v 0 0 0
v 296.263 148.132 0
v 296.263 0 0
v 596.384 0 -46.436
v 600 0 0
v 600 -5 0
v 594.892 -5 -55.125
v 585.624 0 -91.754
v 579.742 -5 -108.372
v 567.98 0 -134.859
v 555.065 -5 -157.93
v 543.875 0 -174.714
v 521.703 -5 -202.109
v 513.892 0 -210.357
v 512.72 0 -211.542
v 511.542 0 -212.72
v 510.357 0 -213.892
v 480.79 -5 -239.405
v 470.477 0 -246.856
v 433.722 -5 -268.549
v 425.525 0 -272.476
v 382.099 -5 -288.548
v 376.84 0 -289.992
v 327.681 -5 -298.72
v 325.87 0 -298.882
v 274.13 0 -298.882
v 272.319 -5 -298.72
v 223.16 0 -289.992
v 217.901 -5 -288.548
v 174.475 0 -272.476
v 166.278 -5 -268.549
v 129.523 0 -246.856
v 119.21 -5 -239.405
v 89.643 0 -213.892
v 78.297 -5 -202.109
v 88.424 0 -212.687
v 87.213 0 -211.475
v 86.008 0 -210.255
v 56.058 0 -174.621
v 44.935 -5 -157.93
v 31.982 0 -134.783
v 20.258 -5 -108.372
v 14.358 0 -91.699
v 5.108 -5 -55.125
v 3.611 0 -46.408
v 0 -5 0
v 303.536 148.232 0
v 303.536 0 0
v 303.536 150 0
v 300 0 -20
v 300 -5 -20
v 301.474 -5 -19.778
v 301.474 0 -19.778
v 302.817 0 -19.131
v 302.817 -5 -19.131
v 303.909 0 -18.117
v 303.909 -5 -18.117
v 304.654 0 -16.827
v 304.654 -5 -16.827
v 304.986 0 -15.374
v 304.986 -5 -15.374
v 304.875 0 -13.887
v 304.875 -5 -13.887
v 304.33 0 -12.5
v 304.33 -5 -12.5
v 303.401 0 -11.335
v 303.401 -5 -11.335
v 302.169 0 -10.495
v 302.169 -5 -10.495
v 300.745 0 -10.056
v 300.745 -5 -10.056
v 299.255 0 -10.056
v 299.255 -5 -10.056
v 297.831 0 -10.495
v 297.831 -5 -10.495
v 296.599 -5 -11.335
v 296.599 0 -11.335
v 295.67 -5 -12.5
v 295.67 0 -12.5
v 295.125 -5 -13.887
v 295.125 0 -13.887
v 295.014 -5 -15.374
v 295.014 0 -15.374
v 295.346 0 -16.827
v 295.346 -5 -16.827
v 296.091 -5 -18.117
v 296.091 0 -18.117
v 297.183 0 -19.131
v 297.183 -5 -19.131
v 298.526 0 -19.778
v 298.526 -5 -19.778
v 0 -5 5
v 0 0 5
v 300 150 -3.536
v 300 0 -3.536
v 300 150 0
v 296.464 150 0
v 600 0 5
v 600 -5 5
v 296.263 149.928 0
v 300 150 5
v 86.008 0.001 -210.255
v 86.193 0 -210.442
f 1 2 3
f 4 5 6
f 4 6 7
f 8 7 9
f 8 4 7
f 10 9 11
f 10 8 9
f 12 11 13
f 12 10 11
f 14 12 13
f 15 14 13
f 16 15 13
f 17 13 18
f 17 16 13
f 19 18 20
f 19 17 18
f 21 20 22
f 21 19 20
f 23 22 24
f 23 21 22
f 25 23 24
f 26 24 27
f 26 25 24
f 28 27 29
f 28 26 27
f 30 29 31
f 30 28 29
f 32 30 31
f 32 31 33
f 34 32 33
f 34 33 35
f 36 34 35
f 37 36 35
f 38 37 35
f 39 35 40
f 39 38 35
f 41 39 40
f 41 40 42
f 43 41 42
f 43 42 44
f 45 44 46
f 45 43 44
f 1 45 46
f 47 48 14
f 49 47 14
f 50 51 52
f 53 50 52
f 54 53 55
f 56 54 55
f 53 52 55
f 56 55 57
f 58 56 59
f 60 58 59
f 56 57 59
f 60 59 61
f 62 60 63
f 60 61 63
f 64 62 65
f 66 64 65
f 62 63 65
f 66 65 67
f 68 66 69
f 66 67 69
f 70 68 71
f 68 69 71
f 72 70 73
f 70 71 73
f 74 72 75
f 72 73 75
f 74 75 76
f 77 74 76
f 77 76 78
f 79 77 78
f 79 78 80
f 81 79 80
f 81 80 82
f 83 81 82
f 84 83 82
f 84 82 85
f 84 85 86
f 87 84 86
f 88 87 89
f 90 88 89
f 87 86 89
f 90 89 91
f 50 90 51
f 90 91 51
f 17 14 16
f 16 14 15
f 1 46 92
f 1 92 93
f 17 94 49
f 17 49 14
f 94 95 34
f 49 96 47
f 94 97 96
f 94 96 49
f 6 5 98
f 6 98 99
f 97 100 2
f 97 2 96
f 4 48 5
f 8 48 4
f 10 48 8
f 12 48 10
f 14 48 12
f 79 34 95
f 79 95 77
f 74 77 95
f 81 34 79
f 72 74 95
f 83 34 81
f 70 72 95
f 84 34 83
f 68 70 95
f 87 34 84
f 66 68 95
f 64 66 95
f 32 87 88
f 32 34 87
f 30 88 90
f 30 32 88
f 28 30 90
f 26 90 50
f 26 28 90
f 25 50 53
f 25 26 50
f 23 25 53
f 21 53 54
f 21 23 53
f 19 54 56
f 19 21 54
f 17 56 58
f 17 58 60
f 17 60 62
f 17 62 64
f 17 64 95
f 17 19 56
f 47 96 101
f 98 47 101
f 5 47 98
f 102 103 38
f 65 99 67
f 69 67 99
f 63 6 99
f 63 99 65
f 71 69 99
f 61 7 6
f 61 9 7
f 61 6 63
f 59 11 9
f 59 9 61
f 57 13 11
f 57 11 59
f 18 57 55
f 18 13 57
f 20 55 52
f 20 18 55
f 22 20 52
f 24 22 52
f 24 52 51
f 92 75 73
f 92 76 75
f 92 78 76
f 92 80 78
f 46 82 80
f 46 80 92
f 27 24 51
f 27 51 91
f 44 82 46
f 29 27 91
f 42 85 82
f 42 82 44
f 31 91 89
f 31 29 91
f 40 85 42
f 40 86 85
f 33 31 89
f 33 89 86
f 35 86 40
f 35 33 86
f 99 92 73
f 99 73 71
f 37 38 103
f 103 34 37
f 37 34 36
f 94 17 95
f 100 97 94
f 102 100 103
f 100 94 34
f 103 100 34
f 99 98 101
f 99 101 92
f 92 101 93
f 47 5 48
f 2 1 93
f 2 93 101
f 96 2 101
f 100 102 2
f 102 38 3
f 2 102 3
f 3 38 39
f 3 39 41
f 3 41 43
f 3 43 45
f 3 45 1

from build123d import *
from OCP.BRepAlgoAPI import BRepAlgoAPI_Cut
from OCP.TopTools import TopTools_ListOfShape

# Parameters (mm, degrees)
SALIENTE_EXTRUIR1_DEPTH = 5
SALIENTE_EXTRUIR2_DEPTH = 5
SALIENTE_EXTRUIR3_DEPTH = 150
CORTAR_EXTRUIR1_REACH   = 655.84
CORTAR_EXTRUIR2_REACH   = 499.984
CORTAR_EXTRUIR3_REACH   = 538.214
CROQUIS6_W              = 4.999913194
CROQUIS6_H              = 150
CORTAR_EXTRUIR4_DEPTH   = 150
CROQUIS8_R              = 5
CORTAR_EXTRUIR5_DEPTH   = 5


with BuildPart() as part:
    # Croquis1 → Saliente-Extruir1 (new body)
    with BuildSketch(Plane(origin=(0, 0, 0), x_dir=(1, 0, 0), z_dir=(0, 1, 0))):
        with BuildLine():
            Line((0, 0), (600, 0))
            ThreePointArc((600, 0), (300, 300), (0, 0))
        make_face()
    extrude(amount=-SALIENTE_EXTRUIR1_DEPTH)

    # Croquis2 → Saliente-Extruir2 (add)
    with BuildSketch(Plane.XY):
        Polygon((300, 150), (600, 0), (600, -5), (0, -5), (0, 0), align=None)
    extrude(amount=SALIENTE_EXTRUIR2_DEPTH)

    # Croquis3 → Saliente-Extruir3 (add)
    with BuildSketch(Plane(origin=(0, 0, 0), x_dir=(1, 0, 0), z_dir=(0, 1, 0))):
        Polygon((89.643082947, 213.892420268), (87.767304207, 212.03132513), (86.007761026, 210.255372485), (296.263133511, 0), (300, 0), (303.535503215, 0), (300, 3.535503215), align=None)
        Polygon((510.356917053, 213.892420268), (300, 3.535503215), (303.535503215, 0), (513.892420268, 210.356917053), (512.132034356, 212.132034356), align=None)
    extrude(amount=SALIENTE_EXTRUIR3_DEPTH)

    # Croquis4 → Cortar-Extruir1 (cut, up to next)
    with BuildSketch(Plane(origin=(148.232248392, 0, 148.232248392), x_dir=(-0.7071067811865465, 0, 0.7071067811865487), z_dir=(-0.7071067811865487, 0, -0.7071067811865465)), mode=Mode.PRIVATE) as cortar_extruir1_sk1:
        Polygon((-214.632012654, 150), (-512.121617689, 0), (-512.121617689, 150), align=None)
    cortar_extruir1_tool1 = extrude(cortar_extruir1_sk1.sketch, amount=-CORTAR_EXTRUIR1_REACH, mode=Mode.PRIVATE) & part.part
    add(cortar_extruir1_tool1.solids().sort_by_distance((440.237945, 100, -143.773448))[0], mode=Mode.SUBTRACT)

    # Croquis5 → Cortar-Extruir2 (cut, up to next)
    with BuildSketch(Plane(origin=(151.767751608, 0, -151.767751608), x_dir=(-0.7071067811865488, 0, -0.7071067811865464), z_dir=(0.7071067811865464, 0, -0.7071067811865488)), mode=Mode.PRIVATE) as cortar_extruir2_sk1:
        Polygon((-209.632056057, 150), (87.857548977, 0), (87.857548977, 150), align=None)
    cortar_extruir2_tool1 = extrude(cortar_extruir2_sk1.sketch, amount=-CORTAR_EXTRUIR2_REACH, mode=Mode.PRIVATE) & part.part
    add(cortar_extruir2_tool1.solids().sort_by_distance((159.762055, 100, -143.773448))[0], mode=Mode.SUBTRACT)

    # Croquis6 → Cortar-Extruir3 (cut, up to next)
    with BuildSketch(Plane(origin=(359.994486555, 0, -363.007018979), x_dir=(-0.7100469213351532, 0, -0.7041543648252638), z_dir=(0.7041543648252638, 0, -0.7100469213351532)), mode=Mode.PRIVATE) as cortar_extruir3_sk1:
        with Locations((-214.264032998, 75)):
            Rectangle(CROQUIS6_W, CROQUIS6_H)
    cortar_extruir3_tool1 = extrude(cortar_extruir3_sk1.sketch, amount=-CORTAR_EXTRUIR3_REACH, mode=Mode.PRIVATE) & part.part
    add(cortar_extruir3_tool1.solids().sort_by_distance((512.132004, 75, -212.132065))[0], mode=Mode.SUBTRACT)


with BuildPart() as cortar_extruir4_tool:
    # Cortar-Extruir4: read off the stored shape, not the designer's step
    # Cortar-Extruir4 outline → Cortar-Extruir4 (new body)
    with BuildSketch(Plane(origin=(0, 0, 0), x_dir=(1, 0, 0), z_dir=(0, 1, 0))):
        Polygon((87.767304207, 212.03132513), (86.192818289, 210.442155589), (89.643082947, 213.892420268), align=None)
    extrude(amount=CORTAR_EXTRUIR4_DEPTH)


with BuildPart() as part_1:
    add(part.part)

    # Cortar-Extruir4: cut by cortar_extruir4_tool, with a tolerance
    cortar_extruir4_stock = TopTools_ListOfShape()
    cortar_extruir4_stock.Append(part_1.part.wrapped)
    cortar_extruir4_tools = TopTools_ListOfShape()
    cortar_extruir4_tools.Append(cortar_extruir4_tool.part.wrapped)
    cortar_extruir4_cut = BRepAlgoAPI_Cut()
    cortar_extruir4_cut.SetArguments(cortar_extruir4_stock)
    cortar_extruir4_cut.SetTools(cortar_extruir4_tools)
    cortar_extruir4_cut.SetFuzzyValue(0.00001)
    cortar_extruir4_cut.Build()
    add(Compound.cast(cortar_extruir4_cut.Shape()).solids(), mode=Mode.REPLACE)

    # Croquis8 → Cortar-Extruir5 (cut)
    with BuildSketch(Plane.XZ.offset(5)):
        with Locations(Location((300, -15, 0), (0, 0, 270))):
            Circle(CROQUIS8_R)
    extrude(amount=-CORTAR_EXTRUIR5_DEPTH, mode=Mode.SUBTRACT)


solid = part_1.part
